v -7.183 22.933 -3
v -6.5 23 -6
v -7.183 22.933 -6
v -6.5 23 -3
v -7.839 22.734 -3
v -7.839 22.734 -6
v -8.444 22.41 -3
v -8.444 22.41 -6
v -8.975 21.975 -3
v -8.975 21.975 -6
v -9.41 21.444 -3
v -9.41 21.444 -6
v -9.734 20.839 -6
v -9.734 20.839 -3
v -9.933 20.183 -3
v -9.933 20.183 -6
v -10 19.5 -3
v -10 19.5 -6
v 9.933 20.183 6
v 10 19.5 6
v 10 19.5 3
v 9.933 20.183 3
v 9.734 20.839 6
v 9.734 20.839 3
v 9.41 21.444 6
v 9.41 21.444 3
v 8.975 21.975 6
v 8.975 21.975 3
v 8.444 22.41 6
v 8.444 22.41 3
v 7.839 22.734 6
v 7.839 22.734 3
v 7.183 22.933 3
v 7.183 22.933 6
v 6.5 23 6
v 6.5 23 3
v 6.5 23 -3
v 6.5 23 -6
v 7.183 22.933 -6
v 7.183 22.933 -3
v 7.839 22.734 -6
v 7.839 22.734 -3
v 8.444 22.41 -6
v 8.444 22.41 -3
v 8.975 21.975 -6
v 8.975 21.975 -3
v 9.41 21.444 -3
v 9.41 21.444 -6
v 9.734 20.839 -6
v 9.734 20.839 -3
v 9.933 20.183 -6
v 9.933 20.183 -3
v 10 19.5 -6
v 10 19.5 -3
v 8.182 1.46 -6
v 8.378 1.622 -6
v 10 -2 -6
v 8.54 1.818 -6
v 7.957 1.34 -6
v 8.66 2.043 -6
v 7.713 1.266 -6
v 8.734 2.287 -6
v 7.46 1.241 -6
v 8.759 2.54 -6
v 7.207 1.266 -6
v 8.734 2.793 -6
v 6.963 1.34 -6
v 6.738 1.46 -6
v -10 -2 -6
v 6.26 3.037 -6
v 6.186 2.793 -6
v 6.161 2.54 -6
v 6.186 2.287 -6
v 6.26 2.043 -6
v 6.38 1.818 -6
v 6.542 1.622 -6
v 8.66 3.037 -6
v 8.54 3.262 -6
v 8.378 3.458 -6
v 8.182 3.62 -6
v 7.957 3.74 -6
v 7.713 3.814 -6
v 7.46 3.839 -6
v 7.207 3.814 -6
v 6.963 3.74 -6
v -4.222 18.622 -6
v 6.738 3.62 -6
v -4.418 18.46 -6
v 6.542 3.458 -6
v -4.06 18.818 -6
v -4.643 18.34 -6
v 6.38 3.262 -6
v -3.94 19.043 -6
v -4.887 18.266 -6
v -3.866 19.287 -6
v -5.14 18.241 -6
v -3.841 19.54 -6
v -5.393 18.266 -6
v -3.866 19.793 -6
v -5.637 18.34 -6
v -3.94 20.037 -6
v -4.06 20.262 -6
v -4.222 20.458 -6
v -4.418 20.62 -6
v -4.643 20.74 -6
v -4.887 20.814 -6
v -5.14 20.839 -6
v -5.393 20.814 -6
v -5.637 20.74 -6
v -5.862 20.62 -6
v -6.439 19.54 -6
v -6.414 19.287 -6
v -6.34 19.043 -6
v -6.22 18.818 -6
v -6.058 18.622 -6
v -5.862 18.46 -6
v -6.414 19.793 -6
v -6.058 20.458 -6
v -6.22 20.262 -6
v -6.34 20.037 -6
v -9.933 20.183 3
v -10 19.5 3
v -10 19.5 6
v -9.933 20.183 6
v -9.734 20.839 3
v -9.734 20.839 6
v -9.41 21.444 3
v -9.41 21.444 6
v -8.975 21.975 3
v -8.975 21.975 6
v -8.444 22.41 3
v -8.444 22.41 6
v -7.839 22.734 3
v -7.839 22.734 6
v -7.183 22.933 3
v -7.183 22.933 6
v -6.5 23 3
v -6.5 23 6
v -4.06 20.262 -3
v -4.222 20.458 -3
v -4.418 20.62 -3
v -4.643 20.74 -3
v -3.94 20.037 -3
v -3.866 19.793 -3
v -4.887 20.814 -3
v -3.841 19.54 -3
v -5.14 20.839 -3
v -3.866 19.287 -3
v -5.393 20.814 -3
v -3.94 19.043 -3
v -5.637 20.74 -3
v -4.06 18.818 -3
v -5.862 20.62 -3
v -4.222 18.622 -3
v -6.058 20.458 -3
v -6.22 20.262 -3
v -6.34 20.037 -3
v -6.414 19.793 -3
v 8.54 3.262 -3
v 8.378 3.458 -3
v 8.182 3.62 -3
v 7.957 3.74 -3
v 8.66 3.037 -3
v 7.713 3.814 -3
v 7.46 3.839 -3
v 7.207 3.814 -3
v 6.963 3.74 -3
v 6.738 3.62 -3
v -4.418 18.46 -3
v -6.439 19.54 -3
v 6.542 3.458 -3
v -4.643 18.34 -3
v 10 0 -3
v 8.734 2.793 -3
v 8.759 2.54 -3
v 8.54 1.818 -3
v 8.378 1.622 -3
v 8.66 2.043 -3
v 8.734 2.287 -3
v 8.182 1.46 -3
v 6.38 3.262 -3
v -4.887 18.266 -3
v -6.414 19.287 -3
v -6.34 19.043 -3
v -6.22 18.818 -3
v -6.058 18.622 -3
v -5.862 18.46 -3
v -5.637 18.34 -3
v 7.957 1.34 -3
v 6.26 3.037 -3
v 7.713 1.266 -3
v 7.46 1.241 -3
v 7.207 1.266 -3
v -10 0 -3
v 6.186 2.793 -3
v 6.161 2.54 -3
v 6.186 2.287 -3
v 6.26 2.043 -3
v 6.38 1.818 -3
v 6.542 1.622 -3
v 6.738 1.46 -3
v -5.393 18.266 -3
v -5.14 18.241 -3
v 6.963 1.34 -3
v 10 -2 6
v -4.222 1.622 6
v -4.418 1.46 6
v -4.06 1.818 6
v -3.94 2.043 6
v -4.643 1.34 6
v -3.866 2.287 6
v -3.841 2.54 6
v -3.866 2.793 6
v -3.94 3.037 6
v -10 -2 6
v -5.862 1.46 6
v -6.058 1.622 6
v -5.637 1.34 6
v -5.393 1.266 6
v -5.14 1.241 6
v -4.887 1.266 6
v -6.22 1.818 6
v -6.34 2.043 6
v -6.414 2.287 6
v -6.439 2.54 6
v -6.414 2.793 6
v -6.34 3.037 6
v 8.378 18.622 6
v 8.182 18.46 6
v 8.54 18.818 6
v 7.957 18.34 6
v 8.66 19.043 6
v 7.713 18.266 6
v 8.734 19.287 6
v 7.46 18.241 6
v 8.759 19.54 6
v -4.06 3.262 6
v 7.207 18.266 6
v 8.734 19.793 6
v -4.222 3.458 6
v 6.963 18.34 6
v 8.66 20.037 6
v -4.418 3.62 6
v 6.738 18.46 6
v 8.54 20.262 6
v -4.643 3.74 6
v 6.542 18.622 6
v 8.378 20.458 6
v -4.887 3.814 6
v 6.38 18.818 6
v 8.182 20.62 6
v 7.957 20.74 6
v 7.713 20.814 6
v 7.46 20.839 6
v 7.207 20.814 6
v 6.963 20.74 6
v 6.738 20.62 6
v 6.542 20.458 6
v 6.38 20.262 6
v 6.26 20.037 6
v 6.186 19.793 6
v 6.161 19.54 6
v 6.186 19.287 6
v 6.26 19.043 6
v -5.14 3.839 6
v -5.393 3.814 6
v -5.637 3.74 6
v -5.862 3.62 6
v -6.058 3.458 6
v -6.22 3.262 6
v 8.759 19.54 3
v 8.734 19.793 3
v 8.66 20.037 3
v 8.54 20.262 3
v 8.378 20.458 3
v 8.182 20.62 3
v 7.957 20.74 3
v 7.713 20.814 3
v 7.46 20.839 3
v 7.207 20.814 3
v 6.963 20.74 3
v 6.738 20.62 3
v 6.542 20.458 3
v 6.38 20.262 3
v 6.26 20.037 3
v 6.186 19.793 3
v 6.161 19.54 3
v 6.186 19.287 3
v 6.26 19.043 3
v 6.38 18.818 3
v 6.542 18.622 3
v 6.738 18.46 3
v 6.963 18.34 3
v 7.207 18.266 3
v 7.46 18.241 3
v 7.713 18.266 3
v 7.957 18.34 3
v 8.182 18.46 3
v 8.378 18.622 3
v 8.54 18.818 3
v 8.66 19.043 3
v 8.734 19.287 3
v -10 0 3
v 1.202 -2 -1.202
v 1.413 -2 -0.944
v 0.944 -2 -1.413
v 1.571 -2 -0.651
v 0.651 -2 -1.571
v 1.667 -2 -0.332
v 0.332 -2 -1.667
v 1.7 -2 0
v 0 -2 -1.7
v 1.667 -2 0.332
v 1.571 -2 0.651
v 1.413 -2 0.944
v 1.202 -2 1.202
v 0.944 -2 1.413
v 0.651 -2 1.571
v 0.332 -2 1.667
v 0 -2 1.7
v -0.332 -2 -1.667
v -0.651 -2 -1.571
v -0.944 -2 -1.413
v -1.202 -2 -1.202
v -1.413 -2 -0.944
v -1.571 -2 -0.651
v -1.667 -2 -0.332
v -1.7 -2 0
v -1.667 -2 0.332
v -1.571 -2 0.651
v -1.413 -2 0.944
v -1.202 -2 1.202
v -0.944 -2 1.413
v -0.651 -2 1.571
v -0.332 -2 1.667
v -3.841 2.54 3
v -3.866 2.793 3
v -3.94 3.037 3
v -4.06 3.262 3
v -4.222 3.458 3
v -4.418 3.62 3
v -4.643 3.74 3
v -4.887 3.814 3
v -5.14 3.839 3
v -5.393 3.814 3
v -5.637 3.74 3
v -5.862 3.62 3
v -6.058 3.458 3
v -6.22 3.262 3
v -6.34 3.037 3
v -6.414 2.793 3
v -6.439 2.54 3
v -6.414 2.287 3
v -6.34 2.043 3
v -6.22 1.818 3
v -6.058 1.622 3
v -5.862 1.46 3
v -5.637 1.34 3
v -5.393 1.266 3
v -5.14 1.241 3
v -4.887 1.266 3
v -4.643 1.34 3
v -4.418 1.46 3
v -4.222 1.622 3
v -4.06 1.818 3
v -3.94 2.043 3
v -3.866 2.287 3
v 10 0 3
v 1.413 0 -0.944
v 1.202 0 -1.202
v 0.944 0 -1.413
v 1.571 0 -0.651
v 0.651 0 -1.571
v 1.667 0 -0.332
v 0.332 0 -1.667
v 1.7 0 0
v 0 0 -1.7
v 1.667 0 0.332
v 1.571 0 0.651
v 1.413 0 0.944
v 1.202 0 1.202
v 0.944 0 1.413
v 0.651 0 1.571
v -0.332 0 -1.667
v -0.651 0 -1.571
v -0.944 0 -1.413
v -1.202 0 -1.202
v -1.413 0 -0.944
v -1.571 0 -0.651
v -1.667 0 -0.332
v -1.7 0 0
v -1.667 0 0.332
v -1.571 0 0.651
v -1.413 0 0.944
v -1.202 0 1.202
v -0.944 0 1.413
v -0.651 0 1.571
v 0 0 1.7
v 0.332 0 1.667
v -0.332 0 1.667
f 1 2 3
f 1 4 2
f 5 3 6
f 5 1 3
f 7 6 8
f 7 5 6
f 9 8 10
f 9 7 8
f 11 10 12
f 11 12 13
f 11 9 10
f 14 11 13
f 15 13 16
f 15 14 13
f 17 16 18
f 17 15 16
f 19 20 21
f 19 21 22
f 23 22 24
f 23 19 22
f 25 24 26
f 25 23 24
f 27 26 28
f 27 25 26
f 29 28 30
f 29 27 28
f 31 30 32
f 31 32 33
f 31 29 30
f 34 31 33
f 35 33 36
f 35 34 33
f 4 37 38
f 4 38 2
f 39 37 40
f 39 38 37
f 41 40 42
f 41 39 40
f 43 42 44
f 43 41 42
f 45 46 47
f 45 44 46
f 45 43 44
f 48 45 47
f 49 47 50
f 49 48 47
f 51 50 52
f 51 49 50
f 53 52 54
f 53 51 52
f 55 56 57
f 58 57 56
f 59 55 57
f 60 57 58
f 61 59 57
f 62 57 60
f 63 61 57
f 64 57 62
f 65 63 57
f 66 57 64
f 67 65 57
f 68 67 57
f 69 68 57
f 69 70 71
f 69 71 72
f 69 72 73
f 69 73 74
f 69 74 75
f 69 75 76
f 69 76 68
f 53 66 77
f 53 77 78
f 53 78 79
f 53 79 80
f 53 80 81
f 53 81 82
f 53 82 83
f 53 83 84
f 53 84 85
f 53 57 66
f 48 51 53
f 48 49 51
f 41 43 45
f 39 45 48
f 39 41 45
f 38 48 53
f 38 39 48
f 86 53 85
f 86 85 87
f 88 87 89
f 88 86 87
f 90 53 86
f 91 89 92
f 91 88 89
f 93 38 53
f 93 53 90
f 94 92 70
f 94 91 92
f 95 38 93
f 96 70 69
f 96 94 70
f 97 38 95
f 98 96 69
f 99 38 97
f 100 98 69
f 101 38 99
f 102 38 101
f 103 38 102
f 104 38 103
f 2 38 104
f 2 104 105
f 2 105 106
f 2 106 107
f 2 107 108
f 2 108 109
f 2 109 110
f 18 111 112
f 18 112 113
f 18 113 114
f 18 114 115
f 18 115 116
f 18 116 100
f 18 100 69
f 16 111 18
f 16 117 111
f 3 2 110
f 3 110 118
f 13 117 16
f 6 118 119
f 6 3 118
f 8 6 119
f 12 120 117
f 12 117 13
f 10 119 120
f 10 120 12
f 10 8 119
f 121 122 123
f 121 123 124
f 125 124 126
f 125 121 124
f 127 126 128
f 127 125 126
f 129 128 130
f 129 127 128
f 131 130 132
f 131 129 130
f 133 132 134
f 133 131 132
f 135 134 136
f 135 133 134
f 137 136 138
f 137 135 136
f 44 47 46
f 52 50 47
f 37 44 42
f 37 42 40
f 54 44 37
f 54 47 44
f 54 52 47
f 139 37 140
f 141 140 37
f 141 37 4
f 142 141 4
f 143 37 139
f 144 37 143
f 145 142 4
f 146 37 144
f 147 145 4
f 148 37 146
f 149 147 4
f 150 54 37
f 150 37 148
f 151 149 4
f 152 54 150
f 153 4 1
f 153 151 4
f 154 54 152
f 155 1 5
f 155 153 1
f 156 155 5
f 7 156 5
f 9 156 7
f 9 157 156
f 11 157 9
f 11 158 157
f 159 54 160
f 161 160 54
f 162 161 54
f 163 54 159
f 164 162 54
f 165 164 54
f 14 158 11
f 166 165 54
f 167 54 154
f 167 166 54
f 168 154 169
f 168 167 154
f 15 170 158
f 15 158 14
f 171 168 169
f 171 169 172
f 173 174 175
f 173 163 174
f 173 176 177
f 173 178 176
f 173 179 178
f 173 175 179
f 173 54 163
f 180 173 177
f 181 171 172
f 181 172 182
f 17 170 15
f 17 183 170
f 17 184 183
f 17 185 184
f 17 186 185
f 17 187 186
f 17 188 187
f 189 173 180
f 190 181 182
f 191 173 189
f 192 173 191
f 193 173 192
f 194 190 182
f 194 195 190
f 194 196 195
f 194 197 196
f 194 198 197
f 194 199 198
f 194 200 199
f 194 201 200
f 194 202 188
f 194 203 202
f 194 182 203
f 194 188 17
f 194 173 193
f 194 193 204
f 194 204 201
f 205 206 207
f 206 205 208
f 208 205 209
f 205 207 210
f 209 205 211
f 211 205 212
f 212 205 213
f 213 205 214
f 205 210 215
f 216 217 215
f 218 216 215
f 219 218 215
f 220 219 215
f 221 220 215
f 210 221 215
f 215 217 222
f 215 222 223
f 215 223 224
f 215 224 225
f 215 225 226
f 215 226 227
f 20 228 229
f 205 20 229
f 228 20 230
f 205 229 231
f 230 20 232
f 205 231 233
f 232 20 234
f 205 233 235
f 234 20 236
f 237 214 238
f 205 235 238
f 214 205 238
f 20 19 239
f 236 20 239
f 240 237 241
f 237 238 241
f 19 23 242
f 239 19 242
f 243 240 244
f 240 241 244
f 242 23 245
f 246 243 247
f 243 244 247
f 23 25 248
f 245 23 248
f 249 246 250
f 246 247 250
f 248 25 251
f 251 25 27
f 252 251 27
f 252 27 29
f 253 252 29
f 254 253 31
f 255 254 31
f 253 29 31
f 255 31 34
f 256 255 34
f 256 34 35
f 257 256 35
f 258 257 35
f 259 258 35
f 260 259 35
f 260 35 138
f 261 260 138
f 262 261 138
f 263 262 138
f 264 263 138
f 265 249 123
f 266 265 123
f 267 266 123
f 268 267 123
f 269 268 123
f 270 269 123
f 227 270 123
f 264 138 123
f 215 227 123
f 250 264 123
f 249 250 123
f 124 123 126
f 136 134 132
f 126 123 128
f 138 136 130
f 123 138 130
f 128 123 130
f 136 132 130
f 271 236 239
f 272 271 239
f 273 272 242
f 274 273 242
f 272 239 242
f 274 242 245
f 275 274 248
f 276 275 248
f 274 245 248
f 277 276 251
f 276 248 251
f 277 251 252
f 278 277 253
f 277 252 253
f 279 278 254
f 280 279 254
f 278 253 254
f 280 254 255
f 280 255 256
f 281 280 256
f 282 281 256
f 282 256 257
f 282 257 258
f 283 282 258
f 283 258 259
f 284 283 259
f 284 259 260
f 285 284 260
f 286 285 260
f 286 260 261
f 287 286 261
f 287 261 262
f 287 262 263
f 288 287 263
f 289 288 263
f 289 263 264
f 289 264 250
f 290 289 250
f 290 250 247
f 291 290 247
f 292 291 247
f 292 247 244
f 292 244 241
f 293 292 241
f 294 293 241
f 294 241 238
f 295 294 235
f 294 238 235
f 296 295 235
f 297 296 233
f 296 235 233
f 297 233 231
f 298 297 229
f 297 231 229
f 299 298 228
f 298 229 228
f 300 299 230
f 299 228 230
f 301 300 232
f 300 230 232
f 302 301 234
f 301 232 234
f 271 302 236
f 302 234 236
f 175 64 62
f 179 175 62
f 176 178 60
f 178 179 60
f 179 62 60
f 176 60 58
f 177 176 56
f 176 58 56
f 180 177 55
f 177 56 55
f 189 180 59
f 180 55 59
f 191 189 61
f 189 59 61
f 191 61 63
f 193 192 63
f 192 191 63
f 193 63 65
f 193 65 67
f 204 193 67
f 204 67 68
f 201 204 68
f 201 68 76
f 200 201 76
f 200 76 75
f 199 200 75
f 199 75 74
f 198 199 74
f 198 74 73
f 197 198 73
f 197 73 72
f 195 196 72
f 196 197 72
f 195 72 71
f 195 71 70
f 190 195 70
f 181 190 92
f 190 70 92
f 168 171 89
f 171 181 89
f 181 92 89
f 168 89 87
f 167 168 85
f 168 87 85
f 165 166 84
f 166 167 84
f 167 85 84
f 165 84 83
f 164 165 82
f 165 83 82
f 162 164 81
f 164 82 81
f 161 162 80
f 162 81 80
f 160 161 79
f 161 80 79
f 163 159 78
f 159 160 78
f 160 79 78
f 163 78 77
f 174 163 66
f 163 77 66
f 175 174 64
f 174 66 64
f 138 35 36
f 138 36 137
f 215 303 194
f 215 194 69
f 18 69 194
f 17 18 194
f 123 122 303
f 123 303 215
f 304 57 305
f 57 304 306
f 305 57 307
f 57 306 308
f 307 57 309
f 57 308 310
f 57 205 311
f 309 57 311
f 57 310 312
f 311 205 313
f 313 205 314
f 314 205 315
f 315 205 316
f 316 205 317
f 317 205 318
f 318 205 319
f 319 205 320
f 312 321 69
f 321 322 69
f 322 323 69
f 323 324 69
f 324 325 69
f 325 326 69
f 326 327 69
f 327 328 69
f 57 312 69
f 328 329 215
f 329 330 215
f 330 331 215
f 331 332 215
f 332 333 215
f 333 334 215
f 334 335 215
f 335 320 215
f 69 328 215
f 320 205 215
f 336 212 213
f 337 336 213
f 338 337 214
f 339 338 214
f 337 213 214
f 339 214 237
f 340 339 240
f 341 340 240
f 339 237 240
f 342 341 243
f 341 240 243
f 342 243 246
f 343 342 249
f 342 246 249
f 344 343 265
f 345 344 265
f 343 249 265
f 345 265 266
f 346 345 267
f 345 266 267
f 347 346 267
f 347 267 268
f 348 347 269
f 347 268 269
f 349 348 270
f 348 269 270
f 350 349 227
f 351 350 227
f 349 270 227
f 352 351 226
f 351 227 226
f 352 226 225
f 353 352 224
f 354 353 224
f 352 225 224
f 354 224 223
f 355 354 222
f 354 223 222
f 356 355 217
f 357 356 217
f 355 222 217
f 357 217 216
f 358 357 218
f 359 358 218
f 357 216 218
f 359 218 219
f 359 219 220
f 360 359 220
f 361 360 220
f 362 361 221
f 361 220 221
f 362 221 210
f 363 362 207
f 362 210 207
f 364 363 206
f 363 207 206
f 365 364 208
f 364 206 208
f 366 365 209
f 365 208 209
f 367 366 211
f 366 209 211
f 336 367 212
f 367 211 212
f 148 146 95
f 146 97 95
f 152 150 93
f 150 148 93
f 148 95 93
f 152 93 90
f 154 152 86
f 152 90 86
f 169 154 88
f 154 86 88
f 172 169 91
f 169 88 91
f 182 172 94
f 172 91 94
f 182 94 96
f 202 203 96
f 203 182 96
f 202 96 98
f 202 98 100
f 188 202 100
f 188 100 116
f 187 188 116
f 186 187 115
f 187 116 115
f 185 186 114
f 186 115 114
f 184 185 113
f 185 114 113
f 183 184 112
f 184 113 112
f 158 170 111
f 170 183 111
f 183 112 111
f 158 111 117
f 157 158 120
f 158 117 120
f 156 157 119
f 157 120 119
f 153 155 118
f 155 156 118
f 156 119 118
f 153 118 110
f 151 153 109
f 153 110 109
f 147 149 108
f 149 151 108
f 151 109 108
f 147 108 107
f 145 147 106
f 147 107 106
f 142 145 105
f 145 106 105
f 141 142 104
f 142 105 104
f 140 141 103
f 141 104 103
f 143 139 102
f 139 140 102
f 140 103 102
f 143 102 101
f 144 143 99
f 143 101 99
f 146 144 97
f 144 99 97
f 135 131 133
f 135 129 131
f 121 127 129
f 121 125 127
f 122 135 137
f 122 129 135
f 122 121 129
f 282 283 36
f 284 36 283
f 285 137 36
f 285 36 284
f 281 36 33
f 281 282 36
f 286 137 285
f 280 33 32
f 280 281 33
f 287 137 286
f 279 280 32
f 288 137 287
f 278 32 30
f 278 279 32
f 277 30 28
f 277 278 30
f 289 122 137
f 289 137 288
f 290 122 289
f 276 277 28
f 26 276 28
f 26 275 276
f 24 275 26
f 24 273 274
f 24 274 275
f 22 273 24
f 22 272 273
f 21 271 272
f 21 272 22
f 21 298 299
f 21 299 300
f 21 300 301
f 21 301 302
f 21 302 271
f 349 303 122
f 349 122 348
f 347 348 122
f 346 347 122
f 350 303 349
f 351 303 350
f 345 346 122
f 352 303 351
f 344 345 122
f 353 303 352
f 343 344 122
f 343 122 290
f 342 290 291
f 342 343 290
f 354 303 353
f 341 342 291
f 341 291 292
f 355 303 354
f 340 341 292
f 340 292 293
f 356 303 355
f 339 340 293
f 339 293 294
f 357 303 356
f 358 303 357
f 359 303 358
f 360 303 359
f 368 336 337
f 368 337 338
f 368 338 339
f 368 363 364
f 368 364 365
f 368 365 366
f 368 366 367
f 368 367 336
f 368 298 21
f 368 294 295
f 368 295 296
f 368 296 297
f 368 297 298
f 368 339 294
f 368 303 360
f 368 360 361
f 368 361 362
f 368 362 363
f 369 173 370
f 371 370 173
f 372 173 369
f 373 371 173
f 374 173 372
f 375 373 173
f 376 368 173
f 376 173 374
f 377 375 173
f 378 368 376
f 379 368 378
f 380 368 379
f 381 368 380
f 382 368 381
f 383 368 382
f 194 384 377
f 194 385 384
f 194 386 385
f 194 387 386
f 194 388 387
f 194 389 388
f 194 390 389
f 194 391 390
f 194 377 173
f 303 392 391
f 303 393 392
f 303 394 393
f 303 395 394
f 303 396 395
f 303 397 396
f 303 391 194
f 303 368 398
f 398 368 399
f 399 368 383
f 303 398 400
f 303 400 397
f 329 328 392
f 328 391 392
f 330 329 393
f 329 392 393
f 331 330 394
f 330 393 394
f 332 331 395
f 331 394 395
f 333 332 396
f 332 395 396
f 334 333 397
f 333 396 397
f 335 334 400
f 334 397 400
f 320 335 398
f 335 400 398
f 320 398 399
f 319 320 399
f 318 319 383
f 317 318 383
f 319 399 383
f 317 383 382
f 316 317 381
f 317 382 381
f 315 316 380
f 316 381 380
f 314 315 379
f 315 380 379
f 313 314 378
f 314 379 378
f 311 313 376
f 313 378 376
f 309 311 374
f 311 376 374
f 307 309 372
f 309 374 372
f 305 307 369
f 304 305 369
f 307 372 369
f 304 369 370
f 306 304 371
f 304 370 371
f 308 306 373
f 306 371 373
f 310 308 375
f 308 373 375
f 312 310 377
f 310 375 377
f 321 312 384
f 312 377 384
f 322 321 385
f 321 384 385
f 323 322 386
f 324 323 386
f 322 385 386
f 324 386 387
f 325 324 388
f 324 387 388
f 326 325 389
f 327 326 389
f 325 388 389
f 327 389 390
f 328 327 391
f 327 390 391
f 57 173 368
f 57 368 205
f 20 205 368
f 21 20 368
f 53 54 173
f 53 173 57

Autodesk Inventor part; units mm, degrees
ref_plane "YZ Plane" through (0, 0, 0) normal (1, 0, 0) x (0, 1, 0)
ref_plane "XZ Plane" through (0, 0, 0) normal (0, 1, 0) x (-1, 0, 0)
ref_plane "XY Plane" through (0, 0, 0) normal (0, 0, 1) x (1, 0, 0)
sketch "Boceto1" plane through (0, 0, 0) normal (0, 1, 0) x (-1, 0, 0)
  circle A0 centre (0, 0) radius 1.7
  line L0 (-10, -3) -> (10, -3)
  line L1 (10, -3) -> (10, 3)
  line L2 (10, 3) -> (-10, 3)
  line L3 (-10, 3) -> (-10, -3)
  line L4 (-10, -3) -> (10, 3) construction
  line L5 (10, -3) -> (-10, 3) construction
  line L6 (10, 3) -> (-10, 3)
  line L7 (-10, 3) -> (-10, 6)
  line L8 (-10, 6) -> (10, 6)
  line L9 (10, 6) -> (10, 3)
  line L10 (10, -3) -> (-10, -3)
  line L11 (-10, -3) -> (-10, -6)
  line L12 (-10, -6) -> (10, -6)
  line L13 (10, -6) -> (10, -3)
  dimension "d0" = 3.4
  dimension "d1" = 20
  dimension "d2" = 6
  dimension "d3" = 3
  dimension "d4" = 3
extrude "Extrusión1" add sketch "Boceto1" against normal blind 2 contours L3 L2 L1 L0
extrude "Extrusión2" add sketch "Boceto1" along normal blind 23 contours L0 L13 L12 L11 | L7 L8 L9 L2
sketch "Boceto2" plane through (-10, 0, 6) normal (0, 0, 1) x (1, 0, 0)
  line L0 (0, 0) -> (20, 0) projected
  line L1 (20, 0) -> (20, 23) projected
  line L2 (0, 23) -> (20, 23) projected
  line L3 (0, 0) -> (0, 23) projected
  circle A0 centre (17.46, 2.54) radius 1.2989
  circle A1 centre (17.46, 19.54) radius 1.2989
  circle A2 centre (4.86, 2.54) radius 1.2989
  circle A3 centre (4.86, 19.54) radius 1.2989
  point P0 (10, 0)
  dimension "d9" = 2.54
  dimension "d10" = 2.54
  dimension "d13" = 17
  dimension "d16" = 12.6
extrude "Extrusión3" cut sketch "Boceto2" against normal up to surface (3 mm away) contours A1 | A2
extrude "Extrusión4" add sketch "Boceto1" against normal blind 2 contours L0 L13 L12 L11 | L7 L8 L9 L2
extrude "Extrusión5" cut sketch "Boceto2" along normal up to surface (3 mm away) from surface at -12 contours A0 | A3
fillet "Empalme1" radius 3.5 4 edges at (-10, 23, 4.5) (-10, 23, -4.5) (10, 23, -4.5) (10, 23, 4.5)
properties part number "Sujetador_radar"
